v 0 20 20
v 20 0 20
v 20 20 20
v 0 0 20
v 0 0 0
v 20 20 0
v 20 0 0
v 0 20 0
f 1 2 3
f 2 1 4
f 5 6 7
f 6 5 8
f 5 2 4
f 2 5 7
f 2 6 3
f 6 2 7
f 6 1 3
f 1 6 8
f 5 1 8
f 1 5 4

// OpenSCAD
// // example.scad
// // A complex 3D model combining various shapes and transformations

// // Main module
// module complex_model() {
//     difference() {
//         // Base cube
//         cube([50, 50, 20], center = true);
        
//         // Cylindrical holes
//         for (i = [-15, 0, 15]) {
//             translate([i, 0, 10]) 
//                 cylinder(h = 20, r = 5, center = true);
//             translate([0, i, 10]) 
//                 cylinder(h = 20, r = 5, center = true);
//         }
        
//         // Spherical cut
//         translate([0, 0, 10])
//             sphere(r = 15);
//     }
// }

// // Call the main module
// complex_model();

// example.scad
// A simple 3D model of a cube

cube([20, 20, 20]); 
